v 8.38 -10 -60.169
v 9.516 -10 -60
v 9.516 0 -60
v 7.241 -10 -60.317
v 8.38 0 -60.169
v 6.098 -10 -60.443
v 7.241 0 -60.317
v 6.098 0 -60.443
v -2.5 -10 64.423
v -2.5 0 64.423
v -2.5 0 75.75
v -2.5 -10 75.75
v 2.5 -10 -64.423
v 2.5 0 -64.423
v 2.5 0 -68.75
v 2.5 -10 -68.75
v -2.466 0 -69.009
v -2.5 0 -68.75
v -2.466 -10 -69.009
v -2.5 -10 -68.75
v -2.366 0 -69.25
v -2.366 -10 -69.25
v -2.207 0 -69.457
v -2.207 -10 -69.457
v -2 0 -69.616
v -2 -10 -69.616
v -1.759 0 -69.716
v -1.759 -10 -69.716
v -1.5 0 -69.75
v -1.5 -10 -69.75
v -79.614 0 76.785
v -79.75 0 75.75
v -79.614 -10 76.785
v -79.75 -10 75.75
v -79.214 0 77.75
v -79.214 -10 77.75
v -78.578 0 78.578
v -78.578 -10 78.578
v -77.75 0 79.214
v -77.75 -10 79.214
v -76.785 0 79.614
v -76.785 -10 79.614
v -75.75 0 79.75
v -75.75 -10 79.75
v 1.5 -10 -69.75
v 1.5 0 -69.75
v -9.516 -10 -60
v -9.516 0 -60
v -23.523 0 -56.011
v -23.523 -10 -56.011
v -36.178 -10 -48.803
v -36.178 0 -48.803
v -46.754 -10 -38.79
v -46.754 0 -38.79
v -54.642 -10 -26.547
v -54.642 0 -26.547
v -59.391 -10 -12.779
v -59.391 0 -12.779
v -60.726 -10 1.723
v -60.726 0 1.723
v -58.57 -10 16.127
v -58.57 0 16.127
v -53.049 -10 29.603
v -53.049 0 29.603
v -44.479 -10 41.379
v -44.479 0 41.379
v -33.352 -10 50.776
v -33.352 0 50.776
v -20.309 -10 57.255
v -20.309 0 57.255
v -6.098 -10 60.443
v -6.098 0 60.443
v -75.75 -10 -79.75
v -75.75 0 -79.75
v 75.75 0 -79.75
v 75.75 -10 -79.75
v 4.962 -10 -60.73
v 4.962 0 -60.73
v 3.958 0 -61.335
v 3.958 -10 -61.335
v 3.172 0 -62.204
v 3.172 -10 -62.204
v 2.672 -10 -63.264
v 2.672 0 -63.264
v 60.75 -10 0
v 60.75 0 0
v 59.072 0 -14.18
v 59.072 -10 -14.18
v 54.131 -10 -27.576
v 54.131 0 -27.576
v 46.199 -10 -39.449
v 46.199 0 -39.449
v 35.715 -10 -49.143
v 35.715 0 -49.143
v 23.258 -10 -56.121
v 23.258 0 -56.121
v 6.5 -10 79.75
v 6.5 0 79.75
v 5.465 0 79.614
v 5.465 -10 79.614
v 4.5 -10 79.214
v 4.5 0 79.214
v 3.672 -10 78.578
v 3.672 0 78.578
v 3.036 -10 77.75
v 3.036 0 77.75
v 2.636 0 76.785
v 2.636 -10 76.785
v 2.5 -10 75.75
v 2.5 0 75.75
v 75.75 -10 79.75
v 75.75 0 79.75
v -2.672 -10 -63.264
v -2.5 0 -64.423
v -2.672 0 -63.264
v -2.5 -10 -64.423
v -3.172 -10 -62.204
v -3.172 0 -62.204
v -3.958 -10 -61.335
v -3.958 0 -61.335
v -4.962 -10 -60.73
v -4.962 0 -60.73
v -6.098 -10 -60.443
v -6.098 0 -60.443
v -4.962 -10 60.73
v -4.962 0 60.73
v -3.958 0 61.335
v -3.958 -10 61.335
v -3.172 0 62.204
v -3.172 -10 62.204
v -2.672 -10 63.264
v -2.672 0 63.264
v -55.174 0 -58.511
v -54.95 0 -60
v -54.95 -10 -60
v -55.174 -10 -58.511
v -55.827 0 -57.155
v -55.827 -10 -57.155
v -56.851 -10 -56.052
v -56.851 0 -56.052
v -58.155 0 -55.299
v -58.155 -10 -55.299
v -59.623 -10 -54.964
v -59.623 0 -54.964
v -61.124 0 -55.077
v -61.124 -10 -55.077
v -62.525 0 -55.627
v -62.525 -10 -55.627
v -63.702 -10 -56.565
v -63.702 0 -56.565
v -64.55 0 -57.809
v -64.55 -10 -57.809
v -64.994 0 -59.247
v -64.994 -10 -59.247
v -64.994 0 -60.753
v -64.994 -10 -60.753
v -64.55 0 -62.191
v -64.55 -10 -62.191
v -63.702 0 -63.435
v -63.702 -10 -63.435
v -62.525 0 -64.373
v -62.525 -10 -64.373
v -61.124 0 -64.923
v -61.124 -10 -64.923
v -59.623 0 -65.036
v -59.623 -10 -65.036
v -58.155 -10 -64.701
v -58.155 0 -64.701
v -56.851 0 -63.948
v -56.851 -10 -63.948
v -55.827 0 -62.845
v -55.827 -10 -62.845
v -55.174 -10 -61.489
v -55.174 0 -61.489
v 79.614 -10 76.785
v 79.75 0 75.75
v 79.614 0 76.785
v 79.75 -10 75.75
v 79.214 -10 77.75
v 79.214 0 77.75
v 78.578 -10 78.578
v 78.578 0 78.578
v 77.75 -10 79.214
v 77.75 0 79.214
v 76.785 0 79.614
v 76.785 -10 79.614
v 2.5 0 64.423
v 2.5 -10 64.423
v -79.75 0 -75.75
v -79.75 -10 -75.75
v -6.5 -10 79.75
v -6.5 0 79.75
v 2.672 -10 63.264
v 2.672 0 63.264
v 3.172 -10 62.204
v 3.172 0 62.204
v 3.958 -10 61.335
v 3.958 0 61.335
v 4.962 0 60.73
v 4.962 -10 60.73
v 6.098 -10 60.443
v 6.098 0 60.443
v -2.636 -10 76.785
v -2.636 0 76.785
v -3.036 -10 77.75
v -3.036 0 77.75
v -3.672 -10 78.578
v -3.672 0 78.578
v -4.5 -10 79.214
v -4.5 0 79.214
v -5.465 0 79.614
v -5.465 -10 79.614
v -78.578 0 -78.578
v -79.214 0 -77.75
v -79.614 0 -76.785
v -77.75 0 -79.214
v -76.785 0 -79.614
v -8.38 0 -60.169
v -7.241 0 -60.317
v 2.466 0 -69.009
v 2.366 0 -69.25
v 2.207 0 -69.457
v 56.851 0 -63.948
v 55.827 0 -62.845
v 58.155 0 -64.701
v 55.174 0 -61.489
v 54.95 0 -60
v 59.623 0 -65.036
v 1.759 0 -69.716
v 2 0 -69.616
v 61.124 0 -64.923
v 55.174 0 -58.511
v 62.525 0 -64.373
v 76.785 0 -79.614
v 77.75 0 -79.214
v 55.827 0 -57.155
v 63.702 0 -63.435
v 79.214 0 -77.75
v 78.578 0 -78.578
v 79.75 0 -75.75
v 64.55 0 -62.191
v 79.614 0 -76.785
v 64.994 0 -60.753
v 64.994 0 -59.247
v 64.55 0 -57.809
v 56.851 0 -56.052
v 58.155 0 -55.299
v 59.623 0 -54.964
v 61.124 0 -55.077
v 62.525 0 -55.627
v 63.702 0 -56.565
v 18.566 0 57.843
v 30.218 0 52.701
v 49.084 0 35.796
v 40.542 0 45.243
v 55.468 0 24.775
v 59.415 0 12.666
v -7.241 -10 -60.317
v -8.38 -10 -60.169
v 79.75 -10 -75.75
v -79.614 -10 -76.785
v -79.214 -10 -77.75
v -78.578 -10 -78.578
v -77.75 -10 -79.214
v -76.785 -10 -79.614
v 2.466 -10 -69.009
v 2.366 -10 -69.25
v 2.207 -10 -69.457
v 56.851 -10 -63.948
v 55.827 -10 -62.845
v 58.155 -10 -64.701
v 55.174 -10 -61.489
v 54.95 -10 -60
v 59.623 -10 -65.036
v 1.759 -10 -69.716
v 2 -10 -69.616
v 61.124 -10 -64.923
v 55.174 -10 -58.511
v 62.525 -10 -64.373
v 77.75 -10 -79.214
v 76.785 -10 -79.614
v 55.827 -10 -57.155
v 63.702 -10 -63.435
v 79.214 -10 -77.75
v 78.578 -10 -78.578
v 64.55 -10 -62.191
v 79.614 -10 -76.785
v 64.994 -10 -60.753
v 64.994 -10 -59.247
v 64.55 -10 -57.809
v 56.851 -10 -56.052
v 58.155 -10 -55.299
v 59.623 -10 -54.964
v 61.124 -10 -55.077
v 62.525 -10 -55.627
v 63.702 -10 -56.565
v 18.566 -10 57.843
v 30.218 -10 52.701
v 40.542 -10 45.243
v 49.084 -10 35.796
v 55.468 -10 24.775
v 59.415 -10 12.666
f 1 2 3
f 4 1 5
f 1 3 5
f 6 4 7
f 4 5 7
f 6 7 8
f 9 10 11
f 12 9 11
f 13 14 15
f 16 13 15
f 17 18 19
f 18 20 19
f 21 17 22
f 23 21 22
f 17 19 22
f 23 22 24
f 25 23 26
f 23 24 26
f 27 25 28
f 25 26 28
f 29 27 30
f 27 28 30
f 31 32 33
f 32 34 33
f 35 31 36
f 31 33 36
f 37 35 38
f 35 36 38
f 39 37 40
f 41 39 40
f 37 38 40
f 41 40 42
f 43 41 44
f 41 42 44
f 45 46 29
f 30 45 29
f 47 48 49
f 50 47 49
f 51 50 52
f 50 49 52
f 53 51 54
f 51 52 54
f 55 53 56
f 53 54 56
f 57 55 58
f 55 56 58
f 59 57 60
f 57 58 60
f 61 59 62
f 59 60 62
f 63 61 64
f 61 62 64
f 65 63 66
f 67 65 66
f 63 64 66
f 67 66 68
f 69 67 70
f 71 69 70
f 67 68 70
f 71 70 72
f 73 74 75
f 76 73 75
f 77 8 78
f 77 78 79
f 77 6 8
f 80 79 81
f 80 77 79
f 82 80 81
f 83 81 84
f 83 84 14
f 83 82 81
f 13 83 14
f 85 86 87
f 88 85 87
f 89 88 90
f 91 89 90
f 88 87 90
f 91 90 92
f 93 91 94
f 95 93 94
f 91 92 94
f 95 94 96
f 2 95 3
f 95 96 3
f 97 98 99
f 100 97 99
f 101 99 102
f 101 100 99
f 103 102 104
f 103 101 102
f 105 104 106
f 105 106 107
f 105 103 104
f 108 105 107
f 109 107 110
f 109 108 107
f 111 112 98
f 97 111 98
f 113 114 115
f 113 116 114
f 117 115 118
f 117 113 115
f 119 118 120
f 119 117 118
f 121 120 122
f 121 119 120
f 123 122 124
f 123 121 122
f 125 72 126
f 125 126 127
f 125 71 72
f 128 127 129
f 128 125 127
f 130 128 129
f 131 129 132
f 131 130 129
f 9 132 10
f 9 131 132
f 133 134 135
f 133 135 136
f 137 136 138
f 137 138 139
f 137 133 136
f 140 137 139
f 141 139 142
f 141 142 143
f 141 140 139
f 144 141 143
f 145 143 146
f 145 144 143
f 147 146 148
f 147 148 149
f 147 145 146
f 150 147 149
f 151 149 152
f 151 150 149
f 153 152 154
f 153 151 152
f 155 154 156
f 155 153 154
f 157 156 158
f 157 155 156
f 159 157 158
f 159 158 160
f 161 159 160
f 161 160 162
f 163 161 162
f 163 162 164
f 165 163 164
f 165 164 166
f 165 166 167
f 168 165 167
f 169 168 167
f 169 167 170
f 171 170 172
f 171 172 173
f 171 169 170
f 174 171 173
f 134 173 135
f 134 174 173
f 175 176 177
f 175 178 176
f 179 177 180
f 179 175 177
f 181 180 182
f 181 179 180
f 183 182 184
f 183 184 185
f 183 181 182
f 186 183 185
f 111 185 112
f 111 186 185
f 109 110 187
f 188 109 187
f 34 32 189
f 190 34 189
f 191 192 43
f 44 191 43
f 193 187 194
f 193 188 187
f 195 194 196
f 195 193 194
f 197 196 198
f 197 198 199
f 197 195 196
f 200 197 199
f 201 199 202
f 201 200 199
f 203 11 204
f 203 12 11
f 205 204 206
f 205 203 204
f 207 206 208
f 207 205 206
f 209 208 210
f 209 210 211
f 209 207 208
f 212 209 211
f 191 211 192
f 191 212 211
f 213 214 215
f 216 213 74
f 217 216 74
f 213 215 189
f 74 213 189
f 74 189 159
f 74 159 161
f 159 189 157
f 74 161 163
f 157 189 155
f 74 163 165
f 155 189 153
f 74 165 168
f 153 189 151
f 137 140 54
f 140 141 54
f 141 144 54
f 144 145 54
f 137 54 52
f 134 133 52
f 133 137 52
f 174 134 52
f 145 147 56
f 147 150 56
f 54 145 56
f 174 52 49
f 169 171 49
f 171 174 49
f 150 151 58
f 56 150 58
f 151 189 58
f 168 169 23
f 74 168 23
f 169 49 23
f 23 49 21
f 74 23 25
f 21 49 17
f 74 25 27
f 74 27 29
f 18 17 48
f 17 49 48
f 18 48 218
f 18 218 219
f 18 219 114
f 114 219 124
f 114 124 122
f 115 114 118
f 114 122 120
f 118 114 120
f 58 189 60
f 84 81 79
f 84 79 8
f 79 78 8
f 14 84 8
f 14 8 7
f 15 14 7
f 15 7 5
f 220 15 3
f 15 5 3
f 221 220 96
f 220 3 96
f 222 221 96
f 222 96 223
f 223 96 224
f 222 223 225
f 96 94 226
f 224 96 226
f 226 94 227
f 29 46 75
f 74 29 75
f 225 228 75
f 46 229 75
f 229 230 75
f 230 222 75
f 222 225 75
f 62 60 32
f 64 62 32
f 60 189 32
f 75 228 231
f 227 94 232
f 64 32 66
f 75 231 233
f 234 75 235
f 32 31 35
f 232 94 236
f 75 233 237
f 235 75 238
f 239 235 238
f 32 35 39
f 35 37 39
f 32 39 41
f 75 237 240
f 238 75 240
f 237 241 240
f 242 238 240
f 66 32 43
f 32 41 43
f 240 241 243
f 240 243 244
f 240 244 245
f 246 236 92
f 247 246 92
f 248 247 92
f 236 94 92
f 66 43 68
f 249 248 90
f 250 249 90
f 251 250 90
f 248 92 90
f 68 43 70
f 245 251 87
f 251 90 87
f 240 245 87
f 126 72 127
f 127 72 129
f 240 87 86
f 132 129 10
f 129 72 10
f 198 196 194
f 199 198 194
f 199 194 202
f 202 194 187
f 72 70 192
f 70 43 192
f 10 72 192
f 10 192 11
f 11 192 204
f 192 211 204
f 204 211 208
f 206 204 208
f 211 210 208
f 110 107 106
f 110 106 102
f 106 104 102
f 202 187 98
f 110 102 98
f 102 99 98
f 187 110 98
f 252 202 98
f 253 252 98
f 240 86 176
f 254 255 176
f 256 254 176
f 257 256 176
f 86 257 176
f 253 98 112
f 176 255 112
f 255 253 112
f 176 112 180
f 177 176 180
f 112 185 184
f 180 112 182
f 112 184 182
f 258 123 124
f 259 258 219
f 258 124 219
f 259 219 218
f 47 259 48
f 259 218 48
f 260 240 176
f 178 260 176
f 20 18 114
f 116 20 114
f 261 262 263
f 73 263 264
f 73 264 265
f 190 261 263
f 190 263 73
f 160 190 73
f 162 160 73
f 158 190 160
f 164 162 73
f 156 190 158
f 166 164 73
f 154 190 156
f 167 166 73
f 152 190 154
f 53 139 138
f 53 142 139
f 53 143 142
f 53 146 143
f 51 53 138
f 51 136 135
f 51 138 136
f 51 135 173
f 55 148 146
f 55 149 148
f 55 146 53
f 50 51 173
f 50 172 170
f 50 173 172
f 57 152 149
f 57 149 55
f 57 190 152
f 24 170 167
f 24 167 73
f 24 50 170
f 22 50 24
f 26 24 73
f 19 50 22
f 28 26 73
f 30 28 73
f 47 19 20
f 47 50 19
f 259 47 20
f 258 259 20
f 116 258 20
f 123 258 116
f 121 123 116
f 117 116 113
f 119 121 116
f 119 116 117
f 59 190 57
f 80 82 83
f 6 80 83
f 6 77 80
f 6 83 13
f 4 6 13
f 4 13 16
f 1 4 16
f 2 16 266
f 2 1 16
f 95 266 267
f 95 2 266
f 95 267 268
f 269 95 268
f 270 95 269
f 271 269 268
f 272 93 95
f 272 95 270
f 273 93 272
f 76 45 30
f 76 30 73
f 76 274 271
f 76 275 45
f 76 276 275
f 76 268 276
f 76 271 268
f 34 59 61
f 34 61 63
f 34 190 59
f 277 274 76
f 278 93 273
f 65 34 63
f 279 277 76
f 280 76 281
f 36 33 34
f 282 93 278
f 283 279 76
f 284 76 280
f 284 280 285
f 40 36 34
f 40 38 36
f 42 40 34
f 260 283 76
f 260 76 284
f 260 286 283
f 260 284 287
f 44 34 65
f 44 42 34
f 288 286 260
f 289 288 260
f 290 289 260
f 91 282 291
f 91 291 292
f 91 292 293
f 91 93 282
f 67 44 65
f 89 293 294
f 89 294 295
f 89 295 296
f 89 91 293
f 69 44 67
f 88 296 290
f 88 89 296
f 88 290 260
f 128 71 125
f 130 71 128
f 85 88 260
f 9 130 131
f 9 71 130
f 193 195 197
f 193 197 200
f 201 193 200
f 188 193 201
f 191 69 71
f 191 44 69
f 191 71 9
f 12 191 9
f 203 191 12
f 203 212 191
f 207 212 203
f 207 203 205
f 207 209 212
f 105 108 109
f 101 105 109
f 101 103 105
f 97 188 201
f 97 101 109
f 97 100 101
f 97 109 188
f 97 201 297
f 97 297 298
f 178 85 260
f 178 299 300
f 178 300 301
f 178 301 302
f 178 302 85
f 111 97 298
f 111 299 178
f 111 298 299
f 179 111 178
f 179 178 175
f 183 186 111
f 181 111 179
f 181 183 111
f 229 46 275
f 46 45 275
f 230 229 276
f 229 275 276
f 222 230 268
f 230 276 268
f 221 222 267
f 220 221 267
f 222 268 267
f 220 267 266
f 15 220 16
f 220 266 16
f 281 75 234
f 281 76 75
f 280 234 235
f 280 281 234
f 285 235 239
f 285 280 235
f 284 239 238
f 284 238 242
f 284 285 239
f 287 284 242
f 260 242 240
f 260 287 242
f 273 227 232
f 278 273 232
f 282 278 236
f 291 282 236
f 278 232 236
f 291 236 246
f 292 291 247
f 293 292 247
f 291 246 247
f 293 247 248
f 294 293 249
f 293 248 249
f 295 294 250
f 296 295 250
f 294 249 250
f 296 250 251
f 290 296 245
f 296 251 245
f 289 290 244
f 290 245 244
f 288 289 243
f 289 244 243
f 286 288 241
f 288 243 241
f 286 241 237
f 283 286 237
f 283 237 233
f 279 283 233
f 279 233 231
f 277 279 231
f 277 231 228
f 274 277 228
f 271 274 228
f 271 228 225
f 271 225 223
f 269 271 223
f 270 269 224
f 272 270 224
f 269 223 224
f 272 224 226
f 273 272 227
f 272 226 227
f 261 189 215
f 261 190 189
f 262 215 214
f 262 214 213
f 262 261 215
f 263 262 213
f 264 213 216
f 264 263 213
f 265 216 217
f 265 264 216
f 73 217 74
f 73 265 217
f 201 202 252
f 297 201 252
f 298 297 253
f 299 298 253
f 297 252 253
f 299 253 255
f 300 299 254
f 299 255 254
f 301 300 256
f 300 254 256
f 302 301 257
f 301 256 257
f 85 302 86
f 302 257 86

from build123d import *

# Parameters (mm, degrees)
F0_R     = 5.05
F0_W     = 2.5
F0_H     = 10
F1_DEPTH = 10
F2_R     = 4
F3_R     = 1


# Not quite as in the source:
# - a feature names something its author has since deleted; it is built from what else it names


with BuildPart() as f1:
    # F0 (on Front) → F1 (new body)
    with BuildSketch(Plane.XZ):
        with BuildLine():
            Line((-79.75, 79.75), (-79.75, -79.75))
            Line((-79.75, -79.75), (-2.5, -79.75))
            Line((-2.5, -79.75), (-2.5, -69.75))
            Line((-2.5, -69.75), (-2.5, -60.6985378737))
            ThreePointArc((-2.5, -60.6985378737), (-6.0183598459, -60.4511525512), (-9.5164331553, -60))
            ThreePointArc((-9.5164331553, -60), (-60.6476127119, 3.5255598628), (-2.5, 60.6985378737))
            Line((-2.5, 60.6985378737), (-2.5, 79.75))
            Line((-2.5, 79.75), (-79.75, 79.75))
        make_face()
        with Locations((-60, -60)):
            Circle(F0_R, mode=Mode.SUBTRACT)
        with BuildLine():
            Line((2.5, -69.75), (2.5, -79.75))
            Line((2.5, -79.75), (79.75, -79.75))
            Line((79.75, -79.75), (79.75, 79.75))
            Line((79.75, 79.75), (2.5, 79.75))
            Line((2.5, 79.75), (2.5, 60.6985378737))
            ThreePointArc((2.5, 60.6985378737), (43.8317094123, 42.0635679656), (60.75, 0))
            ThreePointArc((60.75, 0), (46.198949199, -39.448949199), (9.5164331553, -60))
            ThreePointArc((9.5164331553, -60), (6.0183598459, -60.4511525512), (2.5, -60.6985378737))
            Line((2.5, -60.6985378737), (2.5, -69.75))
        make_face()
        with BuildLine():
            ThreePointArc((65.05, -60), (60, -65.05), (54.95, -60))
            ThreePointArc((54.95, -60), (60, -54.95), (65.05, -60))
        make_face(mode=Mode.SUBTRACT)
        with Locations((-1.25, -74.75)):
            Rectangle(F0_W, F0_H)
        with Locations((1.25, -74.75)):
            Rectangle(F0_W, F0_H)
    extrude(amount=F1_DEPTH)

    # F2
    f2_edges = [f1.edges().sort_by_distance(p)[0] for p in [
        (79.75, -5, 79.75),
        (-79.75, -5, 79.75),
        (-79.75, -5, -79.75),
        (79.75, -5, -79.75),
        (-2.5, -5, 60.698538),
        (-2.5, -5, 79.75),
        (2.5, -5, 79.75),
        (2.5, -5, 60.698538),
        (2.5, -5, -60.698538),
        (-2.5, -5, -60.698538),
    ]]
    fillet(f2_edges, radius=F2_R)

    # F3
    f3_edges = [f1.edges().sort_by_distance(p)[0] for p in [
        (-2.5, -5, -69.75),
        (2.5, -5, -69.75),
    ]]
    fillet(f3_edges, radius=F3_R)


solid = f1.part
